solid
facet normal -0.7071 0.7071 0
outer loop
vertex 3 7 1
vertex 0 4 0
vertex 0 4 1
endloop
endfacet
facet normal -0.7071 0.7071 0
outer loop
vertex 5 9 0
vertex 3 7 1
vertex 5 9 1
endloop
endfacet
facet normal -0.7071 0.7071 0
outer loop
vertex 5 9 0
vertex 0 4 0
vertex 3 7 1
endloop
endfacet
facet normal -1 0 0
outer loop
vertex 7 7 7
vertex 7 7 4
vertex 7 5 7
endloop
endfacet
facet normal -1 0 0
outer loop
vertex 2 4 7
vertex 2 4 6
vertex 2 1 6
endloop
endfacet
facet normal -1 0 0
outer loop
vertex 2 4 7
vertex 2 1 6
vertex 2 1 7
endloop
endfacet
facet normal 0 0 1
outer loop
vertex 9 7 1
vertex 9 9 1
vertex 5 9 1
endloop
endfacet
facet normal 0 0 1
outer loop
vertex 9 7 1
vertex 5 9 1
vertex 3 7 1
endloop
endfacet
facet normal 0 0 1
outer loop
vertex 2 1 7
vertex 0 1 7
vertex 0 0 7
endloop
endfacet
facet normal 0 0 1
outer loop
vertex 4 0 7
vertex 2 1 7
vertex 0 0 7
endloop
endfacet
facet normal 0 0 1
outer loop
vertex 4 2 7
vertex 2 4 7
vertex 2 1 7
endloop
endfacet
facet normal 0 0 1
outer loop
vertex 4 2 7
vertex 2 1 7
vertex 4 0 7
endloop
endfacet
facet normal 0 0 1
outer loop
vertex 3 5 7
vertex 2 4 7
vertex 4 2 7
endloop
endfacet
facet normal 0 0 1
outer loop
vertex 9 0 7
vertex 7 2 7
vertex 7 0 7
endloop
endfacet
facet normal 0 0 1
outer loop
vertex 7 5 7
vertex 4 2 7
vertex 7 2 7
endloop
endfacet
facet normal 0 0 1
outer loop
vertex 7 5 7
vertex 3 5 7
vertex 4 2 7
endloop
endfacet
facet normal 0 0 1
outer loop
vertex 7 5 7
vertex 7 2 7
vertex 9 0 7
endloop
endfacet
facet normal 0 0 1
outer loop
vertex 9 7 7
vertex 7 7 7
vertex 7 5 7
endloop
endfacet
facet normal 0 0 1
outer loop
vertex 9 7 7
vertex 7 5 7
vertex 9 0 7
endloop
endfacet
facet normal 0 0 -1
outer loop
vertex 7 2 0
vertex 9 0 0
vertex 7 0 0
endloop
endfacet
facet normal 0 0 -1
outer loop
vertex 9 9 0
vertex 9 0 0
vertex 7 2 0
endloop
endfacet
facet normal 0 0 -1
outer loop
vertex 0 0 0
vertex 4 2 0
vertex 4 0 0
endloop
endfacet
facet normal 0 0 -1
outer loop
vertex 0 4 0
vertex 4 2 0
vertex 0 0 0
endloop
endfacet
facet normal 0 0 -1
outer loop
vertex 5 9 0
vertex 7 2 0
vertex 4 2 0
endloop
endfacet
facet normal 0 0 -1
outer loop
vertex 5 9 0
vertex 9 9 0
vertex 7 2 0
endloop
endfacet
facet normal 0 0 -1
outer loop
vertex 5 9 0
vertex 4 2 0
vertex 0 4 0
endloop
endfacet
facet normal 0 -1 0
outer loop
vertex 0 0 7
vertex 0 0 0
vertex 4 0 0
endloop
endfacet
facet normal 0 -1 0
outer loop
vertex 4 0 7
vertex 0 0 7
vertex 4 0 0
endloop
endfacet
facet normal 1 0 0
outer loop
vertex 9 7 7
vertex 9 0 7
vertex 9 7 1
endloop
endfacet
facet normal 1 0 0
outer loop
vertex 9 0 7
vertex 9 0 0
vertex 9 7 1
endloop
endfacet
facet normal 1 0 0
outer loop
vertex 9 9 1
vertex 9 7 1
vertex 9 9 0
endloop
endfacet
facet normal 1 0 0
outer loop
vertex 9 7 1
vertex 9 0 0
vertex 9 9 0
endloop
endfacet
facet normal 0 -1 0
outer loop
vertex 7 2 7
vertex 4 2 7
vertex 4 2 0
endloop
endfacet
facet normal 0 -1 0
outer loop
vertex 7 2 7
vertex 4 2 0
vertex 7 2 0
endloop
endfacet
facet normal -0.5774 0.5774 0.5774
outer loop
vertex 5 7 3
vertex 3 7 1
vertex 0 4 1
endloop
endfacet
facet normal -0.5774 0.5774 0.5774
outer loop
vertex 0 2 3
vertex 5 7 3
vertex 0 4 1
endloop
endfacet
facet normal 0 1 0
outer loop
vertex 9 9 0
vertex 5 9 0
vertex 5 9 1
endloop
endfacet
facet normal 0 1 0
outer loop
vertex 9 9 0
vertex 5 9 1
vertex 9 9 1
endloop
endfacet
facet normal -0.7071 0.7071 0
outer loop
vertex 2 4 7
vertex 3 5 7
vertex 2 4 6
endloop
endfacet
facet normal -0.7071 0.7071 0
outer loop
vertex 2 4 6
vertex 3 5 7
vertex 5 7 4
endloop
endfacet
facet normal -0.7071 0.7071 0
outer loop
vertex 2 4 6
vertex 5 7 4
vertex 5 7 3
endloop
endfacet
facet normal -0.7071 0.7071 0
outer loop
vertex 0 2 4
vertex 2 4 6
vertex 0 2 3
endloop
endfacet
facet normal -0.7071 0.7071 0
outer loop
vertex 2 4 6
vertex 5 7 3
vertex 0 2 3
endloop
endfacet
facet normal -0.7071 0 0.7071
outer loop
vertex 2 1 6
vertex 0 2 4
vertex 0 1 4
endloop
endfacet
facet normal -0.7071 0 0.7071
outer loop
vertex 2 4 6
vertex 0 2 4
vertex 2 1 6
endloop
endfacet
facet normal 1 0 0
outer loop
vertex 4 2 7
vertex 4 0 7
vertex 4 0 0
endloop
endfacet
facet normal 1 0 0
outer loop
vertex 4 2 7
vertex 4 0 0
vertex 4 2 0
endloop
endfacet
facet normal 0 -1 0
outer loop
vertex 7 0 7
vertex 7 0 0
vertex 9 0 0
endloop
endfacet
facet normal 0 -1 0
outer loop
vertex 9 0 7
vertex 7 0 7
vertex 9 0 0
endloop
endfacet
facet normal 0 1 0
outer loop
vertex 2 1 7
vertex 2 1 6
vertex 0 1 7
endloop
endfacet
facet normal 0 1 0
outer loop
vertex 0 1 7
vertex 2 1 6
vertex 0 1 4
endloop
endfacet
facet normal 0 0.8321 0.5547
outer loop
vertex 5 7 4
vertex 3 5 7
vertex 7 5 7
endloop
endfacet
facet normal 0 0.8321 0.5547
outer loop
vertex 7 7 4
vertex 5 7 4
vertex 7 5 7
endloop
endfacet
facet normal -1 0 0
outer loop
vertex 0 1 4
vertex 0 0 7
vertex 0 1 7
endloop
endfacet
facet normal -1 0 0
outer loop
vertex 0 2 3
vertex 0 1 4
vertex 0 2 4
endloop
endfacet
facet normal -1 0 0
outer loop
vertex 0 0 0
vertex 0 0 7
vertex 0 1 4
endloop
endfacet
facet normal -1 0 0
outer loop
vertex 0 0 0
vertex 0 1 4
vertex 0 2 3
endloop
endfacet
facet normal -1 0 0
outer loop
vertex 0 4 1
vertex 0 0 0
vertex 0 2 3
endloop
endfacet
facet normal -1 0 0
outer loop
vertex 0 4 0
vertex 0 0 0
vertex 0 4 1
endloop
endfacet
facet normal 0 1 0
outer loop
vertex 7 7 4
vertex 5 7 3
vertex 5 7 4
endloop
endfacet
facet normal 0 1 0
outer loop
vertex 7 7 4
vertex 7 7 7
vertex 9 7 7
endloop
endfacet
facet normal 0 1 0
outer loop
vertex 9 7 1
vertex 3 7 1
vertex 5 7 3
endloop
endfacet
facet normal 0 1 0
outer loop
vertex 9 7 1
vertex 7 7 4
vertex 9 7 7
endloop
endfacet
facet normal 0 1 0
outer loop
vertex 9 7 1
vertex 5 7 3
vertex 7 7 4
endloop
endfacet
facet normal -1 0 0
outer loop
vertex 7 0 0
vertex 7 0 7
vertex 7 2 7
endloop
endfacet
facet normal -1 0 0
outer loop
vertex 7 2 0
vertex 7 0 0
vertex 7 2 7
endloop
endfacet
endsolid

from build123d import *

# Parameters (mm, degrees)
BOSS_EXTRUDE1_DEPTH = 1
SKETCH2_W           = 9
SKETCH2_H           = 7
BOSS_EXTRUDE2_DEPTH = 6
CUT_EXTRUDE1_DEPTH  = 6
SKETCH4_W           = 3
SKETCH4_H           = 2
CUT_EXTRUDE3_DEPTH  = 7
CUT_EXTRUDE5_DEPTH  = 6
CUT_EXTRUDE6_DEPTH  = 6
CUT_EXTRUDE7_DEPTH  = 6


with BuildPart() as part:
    # Sketch1 → Boss-Extrude1 (new body)
    with BuildSketch(Plane.XY):
        Polygon((0, 4), (5, 9), (9, 9), (9, 0), (0, 0), align=None)
    extrude(amount=BOSS_EXTRUDE1_DEPTH)

    # Sketch2 → Boss-Extrude2 (add)
    with BuildSketch(Plane.XY.offset(1)):
        with Locations((4.5, 3.5)):
            Rectangle(SKETCH2_W, SKETCH2_H)
    extrude(amount=BOSS_EXTRUDE2_DEPTH)

    # 3DSketch1 → Cut-Extrude1 (cut, along a direction that is not the sketch's normal)
    with BuildSketch(Plane(origin=(7, 7, 4), x_dir=(-0.7427813527082076, -0.3713906763541037, 0.5570860145311556), z_dir=(0, 0.8320502943378437, 0.554700196225229))):
        Polygon((0, 0), (2.414039396, 2.678136254), (5.385164807, 0), (1.485562705, -1.339068127), align=None)
    extrude(amount=CUT_EXTRUDE1_DEPTH, dir=(0, 1, 0), mode=Mode.SUBTRACT)

    # Sketch4 → Cut-Extrude3 (cut)
    with BuildSketch(Plane.XY.offset(7)):
        with Locations((5.5, 1)):
            Rectangle(SKETCH4_W, SKETCH4_H)
    extrude(amount=-CUT_EXTRUDE3_DEPTH, mode=Mode.SUBTRACT)

    # Sketch5 → Cut-Extrude5 (cut)
    with BuildSketch(Plane(origin=(0, 7, 0), x_dir=(1, 0, 0), z_dir=(0, 1, 0))):
        Polygon((0, -7), (0, -4), (2, -6), (2, -7), align=None)
    extrude(amount=-CUT_EXTRUDE5_DEPTH, mode=Mode.SUBTRACT)

    # 3DSketch4 → Cut-Extrude6 (cut, along a direction that is not the sketch's normal)
    with BuildSketch(Plane(origin=(3, 5, 7), x_dir=(-0.5144957554275265, -0.5144957554275265, -0.6859943405700355), z_dir=(0.7071067811865475, -0.7071067811865476, 0))):
        Polygon((0, 0), (1.028991511, -0.9701425), (1.714985851, -0.242535625), (5.144957554, -0.727606875), (5.830951895, 0), (0.685994341, 4.850712501), (0, 4.123105626), align=None)
    extrude(amount=-CUT_EXTRUDE6_DEPTH, dir=(0, -1, 0), mode=Mode.SUBTRACT)

    # 3DSketch5 → Cut-Extrude7 (cut, along a direction that is not the sketch's normal)
    with BuildSketch(Plane(origin=(0, 2, 3), x_dir=(0.7071067811865476, 0.7071067811865475, 0), z_dir=(-0.577350269189626, 0.577350269189626, 0.5773502691896256))):
        Polygon((0, 0), (1.414213562, 2.449489743), (5.656854249, 2.449489743), (7.071067812, 0), align=None)
    extrude(amount=CUT_EXTRUDE7_DEPTH, dir=(0, 1, 0), mode=Mode.SUBTRACT)


solid = part.part
